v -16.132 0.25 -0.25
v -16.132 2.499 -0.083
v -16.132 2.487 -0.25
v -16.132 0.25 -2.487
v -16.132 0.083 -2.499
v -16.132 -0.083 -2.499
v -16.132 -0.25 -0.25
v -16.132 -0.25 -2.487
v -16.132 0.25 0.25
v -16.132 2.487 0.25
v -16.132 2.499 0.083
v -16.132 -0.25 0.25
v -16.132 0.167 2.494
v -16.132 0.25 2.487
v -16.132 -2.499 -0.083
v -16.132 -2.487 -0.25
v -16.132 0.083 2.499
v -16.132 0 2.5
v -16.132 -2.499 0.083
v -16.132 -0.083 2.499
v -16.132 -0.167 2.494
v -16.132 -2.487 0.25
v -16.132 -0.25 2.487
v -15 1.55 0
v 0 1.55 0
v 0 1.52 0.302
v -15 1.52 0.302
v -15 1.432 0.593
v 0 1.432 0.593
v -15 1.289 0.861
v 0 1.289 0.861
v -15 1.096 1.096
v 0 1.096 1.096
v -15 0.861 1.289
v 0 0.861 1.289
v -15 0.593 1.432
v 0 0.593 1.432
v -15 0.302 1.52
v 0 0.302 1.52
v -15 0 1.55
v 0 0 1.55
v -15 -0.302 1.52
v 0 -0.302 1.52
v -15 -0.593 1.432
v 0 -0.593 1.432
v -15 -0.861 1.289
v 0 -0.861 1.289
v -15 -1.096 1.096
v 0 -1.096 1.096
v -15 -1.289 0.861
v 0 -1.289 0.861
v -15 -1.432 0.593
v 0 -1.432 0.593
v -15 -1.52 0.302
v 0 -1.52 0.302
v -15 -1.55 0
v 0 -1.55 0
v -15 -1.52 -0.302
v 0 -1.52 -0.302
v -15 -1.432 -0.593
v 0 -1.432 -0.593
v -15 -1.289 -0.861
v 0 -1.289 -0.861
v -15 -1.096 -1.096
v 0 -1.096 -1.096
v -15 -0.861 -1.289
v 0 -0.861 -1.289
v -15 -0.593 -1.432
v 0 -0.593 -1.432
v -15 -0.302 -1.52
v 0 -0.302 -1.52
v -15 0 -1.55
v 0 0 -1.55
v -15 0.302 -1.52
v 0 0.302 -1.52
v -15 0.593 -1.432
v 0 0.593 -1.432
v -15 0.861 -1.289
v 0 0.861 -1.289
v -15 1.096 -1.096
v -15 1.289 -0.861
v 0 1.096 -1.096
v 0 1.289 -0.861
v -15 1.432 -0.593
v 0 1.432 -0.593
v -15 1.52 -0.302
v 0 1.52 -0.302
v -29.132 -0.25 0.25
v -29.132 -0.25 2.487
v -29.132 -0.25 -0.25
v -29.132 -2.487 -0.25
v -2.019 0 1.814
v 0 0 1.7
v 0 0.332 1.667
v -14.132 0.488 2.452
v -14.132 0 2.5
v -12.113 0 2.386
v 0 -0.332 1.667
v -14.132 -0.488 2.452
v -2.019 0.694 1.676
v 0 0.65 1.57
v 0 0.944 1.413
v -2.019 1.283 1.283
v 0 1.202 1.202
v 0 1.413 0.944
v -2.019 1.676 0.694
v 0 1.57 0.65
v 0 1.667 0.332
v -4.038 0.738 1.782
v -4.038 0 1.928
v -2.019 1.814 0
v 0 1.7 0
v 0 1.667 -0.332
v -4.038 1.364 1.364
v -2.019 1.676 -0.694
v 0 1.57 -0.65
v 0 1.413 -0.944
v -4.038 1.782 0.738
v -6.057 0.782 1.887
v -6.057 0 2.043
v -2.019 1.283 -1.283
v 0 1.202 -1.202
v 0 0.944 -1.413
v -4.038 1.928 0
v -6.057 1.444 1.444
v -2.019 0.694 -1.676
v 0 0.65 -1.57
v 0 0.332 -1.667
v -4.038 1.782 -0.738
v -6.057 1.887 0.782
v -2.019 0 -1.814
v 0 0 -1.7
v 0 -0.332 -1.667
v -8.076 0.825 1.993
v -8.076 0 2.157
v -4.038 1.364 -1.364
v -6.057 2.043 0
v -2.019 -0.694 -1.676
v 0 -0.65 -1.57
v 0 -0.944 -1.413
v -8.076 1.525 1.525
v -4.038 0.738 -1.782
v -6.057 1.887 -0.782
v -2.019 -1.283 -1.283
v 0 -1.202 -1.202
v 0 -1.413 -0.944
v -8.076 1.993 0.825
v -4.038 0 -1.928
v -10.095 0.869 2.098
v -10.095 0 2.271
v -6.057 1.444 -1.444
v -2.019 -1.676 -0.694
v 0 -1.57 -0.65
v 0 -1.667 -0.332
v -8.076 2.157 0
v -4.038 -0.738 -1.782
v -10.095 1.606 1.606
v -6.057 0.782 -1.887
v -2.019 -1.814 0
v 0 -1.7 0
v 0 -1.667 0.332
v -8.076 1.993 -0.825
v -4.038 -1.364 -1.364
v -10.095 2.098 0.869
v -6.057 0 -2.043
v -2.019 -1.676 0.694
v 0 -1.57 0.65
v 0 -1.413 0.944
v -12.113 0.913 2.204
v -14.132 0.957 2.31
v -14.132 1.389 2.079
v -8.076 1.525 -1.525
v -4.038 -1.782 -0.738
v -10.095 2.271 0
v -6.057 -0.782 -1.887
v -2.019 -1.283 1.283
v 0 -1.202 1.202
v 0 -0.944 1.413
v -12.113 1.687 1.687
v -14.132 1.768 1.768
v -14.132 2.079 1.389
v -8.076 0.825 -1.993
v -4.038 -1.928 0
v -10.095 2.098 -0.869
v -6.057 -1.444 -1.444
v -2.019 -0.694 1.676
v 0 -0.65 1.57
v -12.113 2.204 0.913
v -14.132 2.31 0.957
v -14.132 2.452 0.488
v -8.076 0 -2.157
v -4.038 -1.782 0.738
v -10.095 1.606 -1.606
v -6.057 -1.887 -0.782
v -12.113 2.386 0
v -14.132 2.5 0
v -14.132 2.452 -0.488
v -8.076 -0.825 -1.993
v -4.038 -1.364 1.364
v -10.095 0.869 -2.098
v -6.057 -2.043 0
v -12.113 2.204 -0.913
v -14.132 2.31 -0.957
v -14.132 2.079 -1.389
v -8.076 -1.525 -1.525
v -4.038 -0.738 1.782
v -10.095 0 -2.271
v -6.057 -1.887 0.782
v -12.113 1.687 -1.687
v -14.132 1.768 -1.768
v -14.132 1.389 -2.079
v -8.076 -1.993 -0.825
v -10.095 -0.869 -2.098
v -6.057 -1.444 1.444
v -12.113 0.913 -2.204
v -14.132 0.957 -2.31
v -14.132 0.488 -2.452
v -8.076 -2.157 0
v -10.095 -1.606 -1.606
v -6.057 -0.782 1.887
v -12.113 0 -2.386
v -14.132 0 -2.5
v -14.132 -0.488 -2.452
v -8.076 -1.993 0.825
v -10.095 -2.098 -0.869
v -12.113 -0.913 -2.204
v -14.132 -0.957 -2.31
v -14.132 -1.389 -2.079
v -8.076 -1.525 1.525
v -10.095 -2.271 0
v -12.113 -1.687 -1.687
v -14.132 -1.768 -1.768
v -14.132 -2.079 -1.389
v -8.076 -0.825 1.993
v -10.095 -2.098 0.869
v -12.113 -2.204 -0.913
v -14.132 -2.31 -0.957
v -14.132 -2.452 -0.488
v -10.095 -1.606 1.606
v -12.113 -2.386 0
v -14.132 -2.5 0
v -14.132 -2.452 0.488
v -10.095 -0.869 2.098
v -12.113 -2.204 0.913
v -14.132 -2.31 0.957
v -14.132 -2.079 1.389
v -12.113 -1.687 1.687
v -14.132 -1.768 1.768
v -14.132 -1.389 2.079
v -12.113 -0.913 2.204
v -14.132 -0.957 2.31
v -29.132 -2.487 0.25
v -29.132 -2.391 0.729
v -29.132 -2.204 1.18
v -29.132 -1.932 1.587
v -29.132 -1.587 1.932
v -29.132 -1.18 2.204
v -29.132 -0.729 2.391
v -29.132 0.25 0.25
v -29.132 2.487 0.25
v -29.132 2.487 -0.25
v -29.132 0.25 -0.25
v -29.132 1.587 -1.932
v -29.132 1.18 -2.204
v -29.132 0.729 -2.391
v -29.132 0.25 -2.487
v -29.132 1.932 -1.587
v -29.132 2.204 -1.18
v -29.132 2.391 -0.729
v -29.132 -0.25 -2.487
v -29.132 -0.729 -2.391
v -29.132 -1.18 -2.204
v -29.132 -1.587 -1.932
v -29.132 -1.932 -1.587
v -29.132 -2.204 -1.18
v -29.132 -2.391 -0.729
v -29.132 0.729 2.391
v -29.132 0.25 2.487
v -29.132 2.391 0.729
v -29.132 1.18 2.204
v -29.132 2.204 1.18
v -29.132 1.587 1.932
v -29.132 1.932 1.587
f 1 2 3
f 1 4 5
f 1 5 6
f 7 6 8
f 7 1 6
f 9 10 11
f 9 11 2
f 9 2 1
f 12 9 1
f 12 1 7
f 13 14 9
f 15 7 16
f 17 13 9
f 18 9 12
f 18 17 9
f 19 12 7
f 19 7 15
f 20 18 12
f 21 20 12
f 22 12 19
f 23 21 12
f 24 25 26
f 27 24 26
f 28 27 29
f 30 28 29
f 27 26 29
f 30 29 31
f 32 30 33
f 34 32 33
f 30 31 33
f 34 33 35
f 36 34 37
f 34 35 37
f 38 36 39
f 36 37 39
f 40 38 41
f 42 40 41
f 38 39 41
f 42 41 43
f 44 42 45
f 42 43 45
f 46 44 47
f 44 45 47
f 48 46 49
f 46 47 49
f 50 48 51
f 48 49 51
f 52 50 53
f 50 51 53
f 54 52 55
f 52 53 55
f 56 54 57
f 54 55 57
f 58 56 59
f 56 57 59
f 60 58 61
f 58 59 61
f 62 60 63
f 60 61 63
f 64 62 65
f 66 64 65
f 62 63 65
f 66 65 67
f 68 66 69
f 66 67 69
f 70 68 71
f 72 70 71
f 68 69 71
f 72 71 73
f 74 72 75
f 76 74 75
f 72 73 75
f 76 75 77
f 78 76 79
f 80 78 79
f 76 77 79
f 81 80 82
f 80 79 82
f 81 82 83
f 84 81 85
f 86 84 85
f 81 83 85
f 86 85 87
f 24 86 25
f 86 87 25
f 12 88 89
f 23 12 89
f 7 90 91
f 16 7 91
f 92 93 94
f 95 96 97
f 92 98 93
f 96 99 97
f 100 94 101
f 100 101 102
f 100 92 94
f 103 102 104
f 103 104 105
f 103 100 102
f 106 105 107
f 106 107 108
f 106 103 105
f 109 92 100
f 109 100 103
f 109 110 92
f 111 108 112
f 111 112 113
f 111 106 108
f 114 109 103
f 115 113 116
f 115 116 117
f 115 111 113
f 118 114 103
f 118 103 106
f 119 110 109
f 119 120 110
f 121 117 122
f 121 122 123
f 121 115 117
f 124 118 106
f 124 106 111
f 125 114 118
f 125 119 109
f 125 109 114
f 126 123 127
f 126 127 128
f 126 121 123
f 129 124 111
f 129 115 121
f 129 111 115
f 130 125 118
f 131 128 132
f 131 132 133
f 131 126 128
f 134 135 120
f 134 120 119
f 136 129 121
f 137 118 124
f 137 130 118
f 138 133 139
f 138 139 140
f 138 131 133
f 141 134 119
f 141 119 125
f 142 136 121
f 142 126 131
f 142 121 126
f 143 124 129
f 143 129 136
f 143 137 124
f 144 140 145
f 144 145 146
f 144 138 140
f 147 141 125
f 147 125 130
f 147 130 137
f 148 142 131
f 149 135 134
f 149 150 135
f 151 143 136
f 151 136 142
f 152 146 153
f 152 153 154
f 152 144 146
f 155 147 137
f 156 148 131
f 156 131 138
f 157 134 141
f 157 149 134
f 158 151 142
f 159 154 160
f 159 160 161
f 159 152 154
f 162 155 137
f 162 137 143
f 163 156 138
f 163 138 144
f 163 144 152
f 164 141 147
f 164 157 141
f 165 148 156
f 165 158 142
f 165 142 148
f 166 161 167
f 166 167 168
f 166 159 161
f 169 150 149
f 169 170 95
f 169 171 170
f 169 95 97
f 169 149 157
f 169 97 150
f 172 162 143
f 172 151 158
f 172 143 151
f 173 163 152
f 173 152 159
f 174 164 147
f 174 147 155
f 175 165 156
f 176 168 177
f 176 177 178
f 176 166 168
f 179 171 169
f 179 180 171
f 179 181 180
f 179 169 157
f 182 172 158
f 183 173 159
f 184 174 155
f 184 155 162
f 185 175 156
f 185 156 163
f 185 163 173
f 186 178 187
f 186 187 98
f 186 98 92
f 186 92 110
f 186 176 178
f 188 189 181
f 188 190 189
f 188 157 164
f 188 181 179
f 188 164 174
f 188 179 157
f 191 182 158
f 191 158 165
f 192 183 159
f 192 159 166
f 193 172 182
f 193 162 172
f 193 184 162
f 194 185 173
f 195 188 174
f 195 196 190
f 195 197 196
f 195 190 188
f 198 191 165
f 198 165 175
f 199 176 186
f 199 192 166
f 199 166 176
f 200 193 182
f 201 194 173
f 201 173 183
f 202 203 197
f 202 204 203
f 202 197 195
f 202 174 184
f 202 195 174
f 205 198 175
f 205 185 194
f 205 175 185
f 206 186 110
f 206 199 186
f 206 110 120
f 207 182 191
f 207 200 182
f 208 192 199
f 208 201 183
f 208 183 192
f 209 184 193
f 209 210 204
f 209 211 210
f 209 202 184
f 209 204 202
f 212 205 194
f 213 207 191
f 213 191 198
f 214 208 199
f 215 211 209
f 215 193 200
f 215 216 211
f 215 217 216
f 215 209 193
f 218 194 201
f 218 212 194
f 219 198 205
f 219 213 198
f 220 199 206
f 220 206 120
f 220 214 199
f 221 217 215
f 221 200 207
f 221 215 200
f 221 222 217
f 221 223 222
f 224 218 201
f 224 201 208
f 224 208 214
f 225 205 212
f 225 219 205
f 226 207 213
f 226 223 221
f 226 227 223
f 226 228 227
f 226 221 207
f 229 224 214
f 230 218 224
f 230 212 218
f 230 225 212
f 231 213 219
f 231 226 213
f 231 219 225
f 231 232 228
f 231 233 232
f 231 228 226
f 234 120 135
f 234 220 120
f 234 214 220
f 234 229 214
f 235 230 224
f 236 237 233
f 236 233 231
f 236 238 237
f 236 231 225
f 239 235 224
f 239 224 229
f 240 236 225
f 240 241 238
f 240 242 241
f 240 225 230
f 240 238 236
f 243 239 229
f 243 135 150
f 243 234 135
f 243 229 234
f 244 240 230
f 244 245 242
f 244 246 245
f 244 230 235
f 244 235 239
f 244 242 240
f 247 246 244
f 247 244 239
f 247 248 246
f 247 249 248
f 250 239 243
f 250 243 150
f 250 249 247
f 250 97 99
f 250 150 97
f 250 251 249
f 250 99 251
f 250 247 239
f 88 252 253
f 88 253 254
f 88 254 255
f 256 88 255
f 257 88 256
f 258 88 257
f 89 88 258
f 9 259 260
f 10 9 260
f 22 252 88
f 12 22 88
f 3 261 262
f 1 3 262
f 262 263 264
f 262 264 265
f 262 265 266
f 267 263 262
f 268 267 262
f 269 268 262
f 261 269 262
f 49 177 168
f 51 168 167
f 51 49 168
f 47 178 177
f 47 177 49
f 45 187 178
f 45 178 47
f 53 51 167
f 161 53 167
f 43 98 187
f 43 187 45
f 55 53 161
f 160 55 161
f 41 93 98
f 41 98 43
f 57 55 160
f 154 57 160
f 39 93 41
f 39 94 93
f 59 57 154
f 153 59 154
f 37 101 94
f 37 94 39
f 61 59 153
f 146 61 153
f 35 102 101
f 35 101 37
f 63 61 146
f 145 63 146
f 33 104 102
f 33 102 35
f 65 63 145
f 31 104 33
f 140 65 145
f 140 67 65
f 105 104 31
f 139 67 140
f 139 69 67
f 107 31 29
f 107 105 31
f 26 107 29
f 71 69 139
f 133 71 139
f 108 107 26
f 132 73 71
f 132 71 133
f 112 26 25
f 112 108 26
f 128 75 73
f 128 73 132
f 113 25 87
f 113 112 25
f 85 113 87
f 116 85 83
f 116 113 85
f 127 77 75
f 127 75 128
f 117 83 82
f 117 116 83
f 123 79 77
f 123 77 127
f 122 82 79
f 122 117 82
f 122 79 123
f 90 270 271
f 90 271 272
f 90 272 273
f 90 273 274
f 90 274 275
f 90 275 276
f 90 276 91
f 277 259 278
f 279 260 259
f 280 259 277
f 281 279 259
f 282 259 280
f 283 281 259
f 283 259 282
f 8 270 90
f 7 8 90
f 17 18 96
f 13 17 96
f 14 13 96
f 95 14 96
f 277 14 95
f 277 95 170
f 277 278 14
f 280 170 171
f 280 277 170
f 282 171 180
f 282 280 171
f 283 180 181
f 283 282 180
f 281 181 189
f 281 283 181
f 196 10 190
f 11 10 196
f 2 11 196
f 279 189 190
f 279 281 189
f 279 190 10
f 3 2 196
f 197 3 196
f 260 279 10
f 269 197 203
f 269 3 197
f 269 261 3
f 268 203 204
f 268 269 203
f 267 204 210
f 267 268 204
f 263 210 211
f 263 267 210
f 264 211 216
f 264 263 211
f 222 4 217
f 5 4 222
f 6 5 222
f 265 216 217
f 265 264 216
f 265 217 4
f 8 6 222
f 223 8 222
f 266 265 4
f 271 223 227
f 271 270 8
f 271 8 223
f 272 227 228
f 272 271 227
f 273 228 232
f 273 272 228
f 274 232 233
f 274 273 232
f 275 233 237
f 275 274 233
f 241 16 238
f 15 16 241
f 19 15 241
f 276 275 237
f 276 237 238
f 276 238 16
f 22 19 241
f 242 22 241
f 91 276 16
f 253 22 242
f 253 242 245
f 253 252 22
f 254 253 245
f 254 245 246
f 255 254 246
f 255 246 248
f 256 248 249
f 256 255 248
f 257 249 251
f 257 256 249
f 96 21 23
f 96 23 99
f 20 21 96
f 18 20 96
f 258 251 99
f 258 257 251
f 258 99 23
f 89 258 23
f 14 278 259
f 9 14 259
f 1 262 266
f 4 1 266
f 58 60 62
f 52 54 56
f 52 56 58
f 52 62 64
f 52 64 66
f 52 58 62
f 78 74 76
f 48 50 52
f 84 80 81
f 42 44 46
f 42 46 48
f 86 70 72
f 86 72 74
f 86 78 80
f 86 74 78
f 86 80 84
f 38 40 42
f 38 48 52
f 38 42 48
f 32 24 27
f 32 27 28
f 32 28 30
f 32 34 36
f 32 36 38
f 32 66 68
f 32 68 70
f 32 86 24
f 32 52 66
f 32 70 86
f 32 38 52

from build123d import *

# Parameters (mm, degrees)
F2_R     = 1.55
F3_DEPTH = 15
F5_DEPTH = 13


with BuildPart() as f1:
    # F0 (on Front) → F1 (revolve)
    with BuildSketch(Plane.XZ):
        Polygon((-29.132355, 2.5), (-29.132355, 0), (0, 0), (0, 1.699776), (-14.132355, 2.5), align=None)
    revolve(axis=Axis((-14.566178, 0, 0), (-1, 0, 0)))

    # F2 (on Right) → F3 (cut)
    with BuildSketch(Plane.YZ):
        Circle(F2_R)
    extrude(amount=-F3_DEPTH, mode=Mode.SUBTRACT)

    # F4 (on face) → F5 (cut)
    with BuildSketch(Plane(origin=(-29.132355, 0, 0), x_dir=(0, -1, 0), z_dir=(-1, 0, 0))):
        Polygon((-2.934946, 0.25), (-2.934946, 0), (-2.934946, -0.25), (-0.25, -0.25), (-0.25, -2.634228), (0.25, -2.634228), (0.25, -0.25), (3.675647, -0.25), (3.675647, 0.25), (0.25, 0.25), (0.25, 2.968905), (-0.25, 2.968905), (-0.25, 0.25), align=None)
    extrude(amount=-F5_DEPTH, mode=Mode.SUBTRACT)


solid = f1.part
